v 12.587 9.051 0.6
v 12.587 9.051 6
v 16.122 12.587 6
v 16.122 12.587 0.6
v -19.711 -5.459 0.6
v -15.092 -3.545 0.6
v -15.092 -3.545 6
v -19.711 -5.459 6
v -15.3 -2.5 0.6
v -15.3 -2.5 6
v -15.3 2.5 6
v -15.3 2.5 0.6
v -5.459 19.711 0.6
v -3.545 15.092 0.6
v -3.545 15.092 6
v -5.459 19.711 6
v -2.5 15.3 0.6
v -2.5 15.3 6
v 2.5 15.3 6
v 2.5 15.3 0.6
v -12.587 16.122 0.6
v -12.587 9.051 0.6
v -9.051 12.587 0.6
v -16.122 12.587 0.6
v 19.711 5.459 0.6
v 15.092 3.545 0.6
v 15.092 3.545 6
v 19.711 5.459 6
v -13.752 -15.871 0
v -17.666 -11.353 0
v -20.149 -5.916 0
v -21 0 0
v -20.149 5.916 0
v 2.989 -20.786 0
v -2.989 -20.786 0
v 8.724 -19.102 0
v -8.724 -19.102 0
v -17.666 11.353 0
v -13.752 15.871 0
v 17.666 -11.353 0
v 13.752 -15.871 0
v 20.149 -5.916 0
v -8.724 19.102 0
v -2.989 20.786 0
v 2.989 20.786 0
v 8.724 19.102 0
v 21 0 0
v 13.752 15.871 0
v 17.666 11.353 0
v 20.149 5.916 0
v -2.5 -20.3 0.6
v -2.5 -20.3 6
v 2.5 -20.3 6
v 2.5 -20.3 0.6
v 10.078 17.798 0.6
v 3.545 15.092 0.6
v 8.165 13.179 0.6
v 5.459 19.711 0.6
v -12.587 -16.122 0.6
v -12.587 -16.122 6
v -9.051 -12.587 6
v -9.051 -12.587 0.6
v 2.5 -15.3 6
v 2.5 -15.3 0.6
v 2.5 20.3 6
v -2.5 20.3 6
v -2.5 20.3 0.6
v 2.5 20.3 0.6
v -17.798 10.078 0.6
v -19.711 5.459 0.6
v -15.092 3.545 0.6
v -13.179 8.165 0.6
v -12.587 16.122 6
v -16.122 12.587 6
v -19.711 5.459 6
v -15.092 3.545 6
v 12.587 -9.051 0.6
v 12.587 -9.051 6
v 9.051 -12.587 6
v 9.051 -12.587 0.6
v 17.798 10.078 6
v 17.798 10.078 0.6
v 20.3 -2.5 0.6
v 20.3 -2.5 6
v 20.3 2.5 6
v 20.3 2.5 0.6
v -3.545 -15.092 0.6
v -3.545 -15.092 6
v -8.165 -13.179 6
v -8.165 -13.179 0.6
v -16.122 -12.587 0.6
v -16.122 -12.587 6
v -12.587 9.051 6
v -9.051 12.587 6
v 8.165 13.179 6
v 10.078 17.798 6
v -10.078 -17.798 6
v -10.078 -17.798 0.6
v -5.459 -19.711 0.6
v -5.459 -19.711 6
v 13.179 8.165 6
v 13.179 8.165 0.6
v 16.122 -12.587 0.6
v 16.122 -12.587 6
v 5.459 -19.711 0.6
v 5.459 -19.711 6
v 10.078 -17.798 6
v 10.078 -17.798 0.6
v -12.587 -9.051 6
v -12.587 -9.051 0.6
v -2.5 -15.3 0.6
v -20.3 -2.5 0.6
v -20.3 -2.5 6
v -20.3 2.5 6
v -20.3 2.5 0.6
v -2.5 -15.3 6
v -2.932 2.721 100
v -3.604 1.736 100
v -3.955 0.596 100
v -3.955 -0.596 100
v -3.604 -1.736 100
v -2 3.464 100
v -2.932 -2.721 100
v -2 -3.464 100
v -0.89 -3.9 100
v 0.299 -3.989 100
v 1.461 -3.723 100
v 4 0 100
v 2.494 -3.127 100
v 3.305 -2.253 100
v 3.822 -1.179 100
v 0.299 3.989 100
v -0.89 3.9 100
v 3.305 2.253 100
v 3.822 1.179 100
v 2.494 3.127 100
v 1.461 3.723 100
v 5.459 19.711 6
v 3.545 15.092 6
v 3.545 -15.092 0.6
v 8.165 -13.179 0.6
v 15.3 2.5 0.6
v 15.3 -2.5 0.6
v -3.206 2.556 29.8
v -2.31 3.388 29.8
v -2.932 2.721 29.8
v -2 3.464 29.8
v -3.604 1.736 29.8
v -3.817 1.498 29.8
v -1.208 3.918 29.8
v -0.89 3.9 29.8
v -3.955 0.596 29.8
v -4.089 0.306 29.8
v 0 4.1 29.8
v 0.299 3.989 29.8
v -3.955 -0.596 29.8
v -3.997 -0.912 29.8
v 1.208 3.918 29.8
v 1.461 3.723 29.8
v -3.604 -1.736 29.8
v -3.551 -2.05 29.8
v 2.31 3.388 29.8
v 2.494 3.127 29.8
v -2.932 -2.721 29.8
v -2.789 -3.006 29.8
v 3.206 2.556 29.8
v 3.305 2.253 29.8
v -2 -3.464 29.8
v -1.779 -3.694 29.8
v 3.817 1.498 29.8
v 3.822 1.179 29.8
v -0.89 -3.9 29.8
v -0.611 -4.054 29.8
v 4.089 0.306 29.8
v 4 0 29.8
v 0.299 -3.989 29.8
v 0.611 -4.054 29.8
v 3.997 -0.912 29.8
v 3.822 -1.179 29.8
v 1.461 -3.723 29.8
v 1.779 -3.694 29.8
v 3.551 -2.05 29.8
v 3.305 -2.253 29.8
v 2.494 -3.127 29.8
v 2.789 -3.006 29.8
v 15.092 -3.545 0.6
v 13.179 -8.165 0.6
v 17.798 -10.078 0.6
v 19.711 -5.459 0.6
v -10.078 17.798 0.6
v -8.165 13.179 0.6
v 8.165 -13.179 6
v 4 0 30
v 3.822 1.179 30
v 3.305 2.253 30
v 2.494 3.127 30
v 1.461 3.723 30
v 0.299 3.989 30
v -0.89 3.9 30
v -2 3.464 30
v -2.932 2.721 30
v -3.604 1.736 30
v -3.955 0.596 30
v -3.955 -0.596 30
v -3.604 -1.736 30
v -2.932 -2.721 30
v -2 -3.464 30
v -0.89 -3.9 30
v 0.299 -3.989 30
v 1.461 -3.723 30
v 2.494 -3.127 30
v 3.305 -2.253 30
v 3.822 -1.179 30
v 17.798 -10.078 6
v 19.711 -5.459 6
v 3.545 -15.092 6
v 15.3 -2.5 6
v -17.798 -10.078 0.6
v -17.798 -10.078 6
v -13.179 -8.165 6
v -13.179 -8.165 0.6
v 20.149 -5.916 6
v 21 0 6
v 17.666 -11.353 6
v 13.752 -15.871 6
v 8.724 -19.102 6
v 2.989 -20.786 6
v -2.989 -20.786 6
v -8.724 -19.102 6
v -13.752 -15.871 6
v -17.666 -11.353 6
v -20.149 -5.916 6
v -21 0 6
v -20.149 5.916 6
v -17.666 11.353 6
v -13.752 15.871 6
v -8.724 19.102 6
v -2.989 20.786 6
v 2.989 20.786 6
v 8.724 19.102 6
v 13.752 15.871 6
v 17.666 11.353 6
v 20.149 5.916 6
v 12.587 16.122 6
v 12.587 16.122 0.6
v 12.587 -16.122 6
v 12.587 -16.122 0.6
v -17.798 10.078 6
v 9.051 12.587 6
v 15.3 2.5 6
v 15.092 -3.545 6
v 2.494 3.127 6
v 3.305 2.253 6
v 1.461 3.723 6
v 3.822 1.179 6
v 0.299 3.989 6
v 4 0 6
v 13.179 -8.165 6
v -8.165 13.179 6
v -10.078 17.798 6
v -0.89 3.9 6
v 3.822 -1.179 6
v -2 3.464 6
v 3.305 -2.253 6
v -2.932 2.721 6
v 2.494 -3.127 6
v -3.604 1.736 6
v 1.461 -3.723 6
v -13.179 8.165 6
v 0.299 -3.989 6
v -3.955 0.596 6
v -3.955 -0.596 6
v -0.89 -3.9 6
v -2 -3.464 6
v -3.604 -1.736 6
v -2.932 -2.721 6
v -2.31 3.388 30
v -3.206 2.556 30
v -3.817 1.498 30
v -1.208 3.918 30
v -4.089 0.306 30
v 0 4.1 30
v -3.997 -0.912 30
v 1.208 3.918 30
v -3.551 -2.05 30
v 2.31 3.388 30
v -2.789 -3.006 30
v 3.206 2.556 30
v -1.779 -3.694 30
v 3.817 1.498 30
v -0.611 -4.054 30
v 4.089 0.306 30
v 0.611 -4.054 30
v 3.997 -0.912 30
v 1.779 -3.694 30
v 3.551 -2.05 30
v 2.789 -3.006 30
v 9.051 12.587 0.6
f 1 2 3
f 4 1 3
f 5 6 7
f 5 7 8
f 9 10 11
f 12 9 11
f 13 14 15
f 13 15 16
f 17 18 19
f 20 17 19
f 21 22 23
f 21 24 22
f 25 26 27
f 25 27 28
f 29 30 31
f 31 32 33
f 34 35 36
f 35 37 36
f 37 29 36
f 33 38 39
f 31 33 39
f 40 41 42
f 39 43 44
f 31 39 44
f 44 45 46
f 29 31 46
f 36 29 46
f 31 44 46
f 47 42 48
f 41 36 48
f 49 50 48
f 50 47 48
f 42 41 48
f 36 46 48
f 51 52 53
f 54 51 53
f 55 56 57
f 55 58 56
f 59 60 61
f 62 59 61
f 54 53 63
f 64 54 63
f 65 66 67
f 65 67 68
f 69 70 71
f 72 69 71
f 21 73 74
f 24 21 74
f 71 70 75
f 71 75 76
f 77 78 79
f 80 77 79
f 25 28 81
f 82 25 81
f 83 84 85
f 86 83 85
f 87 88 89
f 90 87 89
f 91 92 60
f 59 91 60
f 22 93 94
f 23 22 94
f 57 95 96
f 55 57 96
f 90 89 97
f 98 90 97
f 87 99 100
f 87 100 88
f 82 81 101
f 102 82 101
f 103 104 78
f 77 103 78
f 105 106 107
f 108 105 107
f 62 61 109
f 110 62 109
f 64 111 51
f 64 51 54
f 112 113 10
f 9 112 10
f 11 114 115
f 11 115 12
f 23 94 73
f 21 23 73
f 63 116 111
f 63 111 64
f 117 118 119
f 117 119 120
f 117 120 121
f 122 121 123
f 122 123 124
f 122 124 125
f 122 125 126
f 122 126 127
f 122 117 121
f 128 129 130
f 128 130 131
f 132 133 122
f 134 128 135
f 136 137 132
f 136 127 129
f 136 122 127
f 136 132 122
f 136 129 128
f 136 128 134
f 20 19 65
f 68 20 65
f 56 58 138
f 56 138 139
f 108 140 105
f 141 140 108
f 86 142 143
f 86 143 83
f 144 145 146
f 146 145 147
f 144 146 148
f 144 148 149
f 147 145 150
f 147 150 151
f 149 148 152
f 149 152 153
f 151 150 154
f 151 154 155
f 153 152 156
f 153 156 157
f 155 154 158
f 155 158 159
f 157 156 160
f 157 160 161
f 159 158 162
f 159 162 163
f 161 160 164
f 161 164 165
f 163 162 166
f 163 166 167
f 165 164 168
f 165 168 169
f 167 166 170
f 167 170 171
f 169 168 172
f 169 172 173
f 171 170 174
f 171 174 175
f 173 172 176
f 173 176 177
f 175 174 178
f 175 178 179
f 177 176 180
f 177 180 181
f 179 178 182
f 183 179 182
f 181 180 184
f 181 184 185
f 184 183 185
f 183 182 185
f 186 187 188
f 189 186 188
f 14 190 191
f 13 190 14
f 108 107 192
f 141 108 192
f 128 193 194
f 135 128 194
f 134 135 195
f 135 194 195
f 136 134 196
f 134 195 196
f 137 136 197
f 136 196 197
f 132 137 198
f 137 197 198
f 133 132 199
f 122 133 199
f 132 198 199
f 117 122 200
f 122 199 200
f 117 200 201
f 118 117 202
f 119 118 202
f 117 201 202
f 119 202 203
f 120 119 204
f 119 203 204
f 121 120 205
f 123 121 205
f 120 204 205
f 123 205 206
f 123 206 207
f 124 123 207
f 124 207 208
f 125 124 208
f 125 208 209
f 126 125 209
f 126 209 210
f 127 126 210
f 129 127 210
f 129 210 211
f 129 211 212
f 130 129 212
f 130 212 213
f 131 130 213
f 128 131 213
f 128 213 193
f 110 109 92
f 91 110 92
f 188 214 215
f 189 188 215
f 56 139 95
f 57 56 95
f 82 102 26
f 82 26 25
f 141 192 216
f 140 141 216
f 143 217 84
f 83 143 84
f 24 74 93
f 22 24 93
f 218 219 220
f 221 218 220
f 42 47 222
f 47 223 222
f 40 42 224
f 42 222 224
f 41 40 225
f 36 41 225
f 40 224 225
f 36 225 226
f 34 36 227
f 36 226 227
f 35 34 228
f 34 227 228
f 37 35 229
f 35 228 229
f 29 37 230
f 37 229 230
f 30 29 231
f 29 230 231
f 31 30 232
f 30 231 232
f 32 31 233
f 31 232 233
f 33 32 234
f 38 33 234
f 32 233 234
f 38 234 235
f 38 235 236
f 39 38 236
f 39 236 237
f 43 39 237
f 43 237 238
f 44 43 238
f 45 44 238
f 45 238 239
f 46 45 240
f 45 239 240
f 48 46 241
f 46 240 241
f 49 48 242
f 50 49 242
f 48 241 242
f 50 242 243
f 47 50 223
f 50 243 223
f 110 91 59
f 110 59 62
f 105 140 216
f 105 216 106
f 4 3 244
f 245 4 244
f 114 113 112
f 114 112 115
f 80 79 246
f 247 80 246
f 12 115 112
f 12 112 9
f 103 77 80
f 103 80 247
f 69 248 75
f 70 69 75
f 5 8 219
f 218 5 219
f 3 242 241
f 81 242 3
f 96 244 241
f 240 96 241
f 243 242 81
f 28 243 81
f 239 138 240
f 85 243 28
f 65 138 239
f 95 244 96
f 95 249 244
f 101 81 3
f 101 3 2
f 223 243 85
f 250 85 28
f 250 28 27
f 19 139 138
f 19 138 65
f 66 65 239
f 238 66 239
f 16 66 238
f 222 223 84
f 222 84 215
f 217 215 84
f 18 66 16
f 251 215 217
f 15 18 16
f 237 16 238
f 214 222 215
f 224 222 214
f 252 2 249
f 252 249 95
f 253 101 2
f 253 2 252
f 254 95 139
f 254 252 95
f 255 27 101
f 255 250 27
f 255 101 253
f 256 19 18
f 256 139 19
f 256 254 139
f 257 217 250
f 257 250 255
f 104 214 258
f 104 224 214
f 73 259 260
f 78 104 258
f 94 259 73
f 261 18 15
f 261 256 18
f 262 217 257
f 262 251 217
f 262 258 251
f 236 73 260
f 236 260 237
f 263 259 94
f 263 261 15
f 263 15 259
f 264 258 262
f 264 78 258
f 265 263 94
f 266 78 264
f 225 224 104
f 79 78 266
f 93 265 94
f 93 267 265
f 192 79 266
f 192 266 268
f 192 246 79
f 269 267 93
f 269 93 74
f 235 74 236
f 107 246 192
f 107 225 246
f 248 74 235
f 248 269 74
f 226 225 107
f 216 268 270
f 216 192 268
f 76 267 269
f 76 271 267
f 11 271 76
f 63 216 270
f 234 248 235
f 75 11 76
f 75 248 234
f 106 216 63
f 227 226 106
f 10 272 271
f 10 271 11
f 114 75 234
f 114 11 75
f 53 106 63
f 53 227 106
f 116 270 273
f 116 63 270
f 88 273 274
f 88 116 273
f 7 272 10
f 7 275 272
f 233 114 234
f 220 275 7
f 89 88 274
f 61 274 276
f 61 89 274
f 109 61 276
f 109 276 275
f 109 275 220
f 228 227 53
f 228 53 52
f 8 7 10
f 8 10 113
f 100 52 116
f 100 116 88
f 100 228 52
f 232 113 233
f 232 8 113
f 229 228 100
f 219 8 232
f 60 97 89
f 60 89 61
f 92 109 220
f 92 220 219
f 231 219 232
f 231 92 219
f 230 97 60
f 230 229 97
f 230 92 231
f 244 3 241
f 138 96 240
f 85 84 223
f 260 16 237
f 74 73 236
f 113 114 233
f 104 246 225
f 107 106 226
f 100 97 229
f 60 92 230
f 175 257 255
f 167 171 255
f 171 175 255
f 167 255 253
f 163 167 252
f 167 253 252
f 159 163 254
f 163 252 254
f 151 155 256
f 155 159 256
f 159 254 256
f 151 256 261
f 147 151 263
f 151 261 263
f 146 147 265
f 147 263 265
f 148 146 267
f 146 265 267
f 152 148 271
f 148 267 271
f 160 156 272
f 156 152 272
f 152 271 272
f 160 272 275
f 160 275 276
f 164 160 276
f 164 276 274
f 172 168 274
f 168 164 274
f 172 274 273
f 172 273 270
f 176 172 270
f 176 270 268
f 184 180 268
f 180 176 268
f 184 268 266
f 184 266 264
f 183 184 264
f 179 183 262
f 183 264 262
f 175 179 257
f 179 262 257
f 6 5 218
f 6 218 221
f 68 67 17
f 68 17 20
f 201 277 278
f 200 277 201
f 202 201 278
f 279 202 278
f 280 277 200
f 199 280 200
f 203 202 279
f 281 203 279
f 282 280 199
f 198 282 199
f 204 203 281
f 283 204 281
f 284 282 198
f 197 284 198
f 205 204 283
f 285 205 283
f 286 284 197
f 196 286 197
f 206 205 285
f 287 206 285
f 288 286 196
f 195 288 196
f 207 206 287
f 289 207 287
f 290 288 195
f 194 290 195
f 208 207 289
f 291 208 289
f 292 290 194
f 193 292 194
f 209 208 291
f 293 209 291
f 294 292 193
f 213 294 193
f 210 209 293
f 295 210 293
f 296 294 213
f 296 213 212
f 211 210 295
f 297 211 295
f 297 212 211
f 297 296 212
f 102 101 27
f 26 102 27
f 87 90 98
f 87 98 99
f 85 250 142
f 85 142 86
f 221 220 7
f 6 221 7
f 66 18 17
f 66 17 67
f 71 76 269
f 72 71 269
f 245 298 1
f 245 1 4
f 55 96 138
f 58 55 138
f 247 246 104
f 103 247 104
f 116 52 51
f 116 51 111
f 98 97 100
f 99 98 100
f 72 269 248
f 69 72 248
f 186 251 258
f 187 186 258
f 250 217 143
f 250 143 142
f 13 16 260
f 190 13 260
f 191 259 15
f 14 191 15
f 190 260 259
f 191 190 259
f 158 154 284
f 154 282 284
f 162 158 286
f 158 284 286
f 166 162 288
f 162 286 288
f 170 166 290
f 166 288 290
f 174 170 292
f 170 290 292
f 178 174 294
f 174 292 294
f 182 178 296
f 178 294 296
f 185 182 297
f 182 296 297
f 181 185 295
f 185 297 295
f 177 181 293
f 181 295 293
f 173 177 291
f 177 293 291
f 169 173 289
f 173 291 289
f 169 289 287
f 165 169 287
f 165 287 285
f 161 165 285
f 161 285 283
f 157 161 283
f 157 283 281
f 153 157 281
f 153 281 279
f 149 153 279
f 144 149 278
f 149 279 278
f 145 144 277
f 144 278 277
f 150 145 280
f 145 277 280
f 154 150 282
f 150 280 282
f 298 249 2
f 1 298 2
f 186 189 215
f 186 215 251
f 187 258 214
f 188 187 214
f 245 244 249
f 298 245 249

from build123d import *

# Parameters (mm, degrees)
F0_W     = 21
F0_H     = 6
F2_R     = 4
F3_DEPTH = 100
F4_W     = 5
F4_H     = 5
F5_DEPTH = 5.4
F6_W     = 4.1
F6_H     = 0.2


# Not quite as in the source:
# - a feature names something its author has since deleted; it is built from what else it names


with BuildPart() as f1:
    # F0 (on Front) → F1 (revolve)
    with BuildSketch(Plane.XZ):
        with Locations((10.5, 3)):
            Rectangle(F0_W, F0_H)
    revolve(axis=Axis((0, 0, 3), (0, 0, -1)))

    # F2 (on Top) → F3 (join)
    with BuildSketch(Plane.XY):
        Circle(F2_R)
    extrude(amount=F3_DEPTH)

    # F4 (on face) → F5 (cut)
    with BuildSketch(Plane.XY.offset(6)):
        with Locations((0, 17.8)):
            Rectangle(F4_W, F4_H)
        Polygon((-8.1647553465, 13.1786482665), (-3.5453576839, 15.0920654283), (-5.4587748457, 19.7114630909), (-10.0781725083, 17.7980459291), align=None)
        Polygon((3.5453576839, 15.0920654283), (8.1647553465, 13.1786482665), (10.0781725083, 17.7980459291), (5.4587748457, 19.7114630909), align=None)
        Polygon((9.0509667992, 12.5865007051), (12.5865007051, 9.0509667992), (16.1220346111, 12.5865007051), (12.5865007051, 16.1220346111), align=None)
        Polygon((13.1786482665, 8.1647553465), (15.0920654283, 3.5453576839), (19.7114630909, 5.4587748457), (17.7980459291, 10.0781725083), align=None)
        with Locations((17.8, 0)):
            Rectangle(F4_W, F4_H)
        Polygon((15.0920654283, -3.5453576839), (13.1786482665, -8.1647553465), (17.7980459291, -10.0781725083), (19.7114630909, -5.4587748457), align=None)
        Polygon((12.5865007051, -9.0509667992), (9.0509667992, -12.5865007051), (12.5865007051, -16.1220346111), (16.1220346111, -12.5865007051), align=None)
        Polygon((-12.5865007051, 9.0509667992), (-9.0509667992, 12.5865007051), (-12.5865007051, 16.1220346111), (-16.1220346111, 12.5865007051), align=None)
        Polygon((-15.0920654283, 3.5453576839), (-13.1786482665, 8.1647553465), (-17.7980459291, 10.0781725083), (-19.7114630909, 5.4587748457), align=None)
        with Locations((-17.8, 0)):
            Rectangle(F4_W, F4_H)
        Polygon((-13.1786482665, -8.1647553465), (-15.0920654283, -3.5453576839), (-19.7114630909, -5.4587748457), (-17.7980459291, -10.0781725083), align=None)
        Polygon((-9.0509667992, -12.5865007051), (-12.5865007051, -9.0509667992), (-16.1220346111, -12.5865007051), (-12.5865007051, -16.1220346111), align=None)
        Polygon((-3.5453576839, -15.0920654283), (-8.1647553465, -13.1786482665), (-10.0781725083, -17.7980459291), (-5.4587748457, -19.7114630909), align=None)
        with Locations((0, -17.8)):
            Rectangle(F4_W, F4_H)
        Polygon((8.1647553465, -13.1786482665), (3.5453576839, -15.0920654283), (5.4587748457, -19.7114630909), (10.0781725083, -17.7980459291), align=None)
    extrude(amount=-F5_DEPTH, mode=Mode.SUBTRACT)

    # F6 (on Right) → F7 (revolve)
    with BuildSketch(Plane.YZ):
        with Locations((2.05, 29.9)):
            Rectangle(F6_W, F6_H)
    revolve(axis=Axis((0, 0, 29.9), (0, 0, -1)))


solid = f1.part
